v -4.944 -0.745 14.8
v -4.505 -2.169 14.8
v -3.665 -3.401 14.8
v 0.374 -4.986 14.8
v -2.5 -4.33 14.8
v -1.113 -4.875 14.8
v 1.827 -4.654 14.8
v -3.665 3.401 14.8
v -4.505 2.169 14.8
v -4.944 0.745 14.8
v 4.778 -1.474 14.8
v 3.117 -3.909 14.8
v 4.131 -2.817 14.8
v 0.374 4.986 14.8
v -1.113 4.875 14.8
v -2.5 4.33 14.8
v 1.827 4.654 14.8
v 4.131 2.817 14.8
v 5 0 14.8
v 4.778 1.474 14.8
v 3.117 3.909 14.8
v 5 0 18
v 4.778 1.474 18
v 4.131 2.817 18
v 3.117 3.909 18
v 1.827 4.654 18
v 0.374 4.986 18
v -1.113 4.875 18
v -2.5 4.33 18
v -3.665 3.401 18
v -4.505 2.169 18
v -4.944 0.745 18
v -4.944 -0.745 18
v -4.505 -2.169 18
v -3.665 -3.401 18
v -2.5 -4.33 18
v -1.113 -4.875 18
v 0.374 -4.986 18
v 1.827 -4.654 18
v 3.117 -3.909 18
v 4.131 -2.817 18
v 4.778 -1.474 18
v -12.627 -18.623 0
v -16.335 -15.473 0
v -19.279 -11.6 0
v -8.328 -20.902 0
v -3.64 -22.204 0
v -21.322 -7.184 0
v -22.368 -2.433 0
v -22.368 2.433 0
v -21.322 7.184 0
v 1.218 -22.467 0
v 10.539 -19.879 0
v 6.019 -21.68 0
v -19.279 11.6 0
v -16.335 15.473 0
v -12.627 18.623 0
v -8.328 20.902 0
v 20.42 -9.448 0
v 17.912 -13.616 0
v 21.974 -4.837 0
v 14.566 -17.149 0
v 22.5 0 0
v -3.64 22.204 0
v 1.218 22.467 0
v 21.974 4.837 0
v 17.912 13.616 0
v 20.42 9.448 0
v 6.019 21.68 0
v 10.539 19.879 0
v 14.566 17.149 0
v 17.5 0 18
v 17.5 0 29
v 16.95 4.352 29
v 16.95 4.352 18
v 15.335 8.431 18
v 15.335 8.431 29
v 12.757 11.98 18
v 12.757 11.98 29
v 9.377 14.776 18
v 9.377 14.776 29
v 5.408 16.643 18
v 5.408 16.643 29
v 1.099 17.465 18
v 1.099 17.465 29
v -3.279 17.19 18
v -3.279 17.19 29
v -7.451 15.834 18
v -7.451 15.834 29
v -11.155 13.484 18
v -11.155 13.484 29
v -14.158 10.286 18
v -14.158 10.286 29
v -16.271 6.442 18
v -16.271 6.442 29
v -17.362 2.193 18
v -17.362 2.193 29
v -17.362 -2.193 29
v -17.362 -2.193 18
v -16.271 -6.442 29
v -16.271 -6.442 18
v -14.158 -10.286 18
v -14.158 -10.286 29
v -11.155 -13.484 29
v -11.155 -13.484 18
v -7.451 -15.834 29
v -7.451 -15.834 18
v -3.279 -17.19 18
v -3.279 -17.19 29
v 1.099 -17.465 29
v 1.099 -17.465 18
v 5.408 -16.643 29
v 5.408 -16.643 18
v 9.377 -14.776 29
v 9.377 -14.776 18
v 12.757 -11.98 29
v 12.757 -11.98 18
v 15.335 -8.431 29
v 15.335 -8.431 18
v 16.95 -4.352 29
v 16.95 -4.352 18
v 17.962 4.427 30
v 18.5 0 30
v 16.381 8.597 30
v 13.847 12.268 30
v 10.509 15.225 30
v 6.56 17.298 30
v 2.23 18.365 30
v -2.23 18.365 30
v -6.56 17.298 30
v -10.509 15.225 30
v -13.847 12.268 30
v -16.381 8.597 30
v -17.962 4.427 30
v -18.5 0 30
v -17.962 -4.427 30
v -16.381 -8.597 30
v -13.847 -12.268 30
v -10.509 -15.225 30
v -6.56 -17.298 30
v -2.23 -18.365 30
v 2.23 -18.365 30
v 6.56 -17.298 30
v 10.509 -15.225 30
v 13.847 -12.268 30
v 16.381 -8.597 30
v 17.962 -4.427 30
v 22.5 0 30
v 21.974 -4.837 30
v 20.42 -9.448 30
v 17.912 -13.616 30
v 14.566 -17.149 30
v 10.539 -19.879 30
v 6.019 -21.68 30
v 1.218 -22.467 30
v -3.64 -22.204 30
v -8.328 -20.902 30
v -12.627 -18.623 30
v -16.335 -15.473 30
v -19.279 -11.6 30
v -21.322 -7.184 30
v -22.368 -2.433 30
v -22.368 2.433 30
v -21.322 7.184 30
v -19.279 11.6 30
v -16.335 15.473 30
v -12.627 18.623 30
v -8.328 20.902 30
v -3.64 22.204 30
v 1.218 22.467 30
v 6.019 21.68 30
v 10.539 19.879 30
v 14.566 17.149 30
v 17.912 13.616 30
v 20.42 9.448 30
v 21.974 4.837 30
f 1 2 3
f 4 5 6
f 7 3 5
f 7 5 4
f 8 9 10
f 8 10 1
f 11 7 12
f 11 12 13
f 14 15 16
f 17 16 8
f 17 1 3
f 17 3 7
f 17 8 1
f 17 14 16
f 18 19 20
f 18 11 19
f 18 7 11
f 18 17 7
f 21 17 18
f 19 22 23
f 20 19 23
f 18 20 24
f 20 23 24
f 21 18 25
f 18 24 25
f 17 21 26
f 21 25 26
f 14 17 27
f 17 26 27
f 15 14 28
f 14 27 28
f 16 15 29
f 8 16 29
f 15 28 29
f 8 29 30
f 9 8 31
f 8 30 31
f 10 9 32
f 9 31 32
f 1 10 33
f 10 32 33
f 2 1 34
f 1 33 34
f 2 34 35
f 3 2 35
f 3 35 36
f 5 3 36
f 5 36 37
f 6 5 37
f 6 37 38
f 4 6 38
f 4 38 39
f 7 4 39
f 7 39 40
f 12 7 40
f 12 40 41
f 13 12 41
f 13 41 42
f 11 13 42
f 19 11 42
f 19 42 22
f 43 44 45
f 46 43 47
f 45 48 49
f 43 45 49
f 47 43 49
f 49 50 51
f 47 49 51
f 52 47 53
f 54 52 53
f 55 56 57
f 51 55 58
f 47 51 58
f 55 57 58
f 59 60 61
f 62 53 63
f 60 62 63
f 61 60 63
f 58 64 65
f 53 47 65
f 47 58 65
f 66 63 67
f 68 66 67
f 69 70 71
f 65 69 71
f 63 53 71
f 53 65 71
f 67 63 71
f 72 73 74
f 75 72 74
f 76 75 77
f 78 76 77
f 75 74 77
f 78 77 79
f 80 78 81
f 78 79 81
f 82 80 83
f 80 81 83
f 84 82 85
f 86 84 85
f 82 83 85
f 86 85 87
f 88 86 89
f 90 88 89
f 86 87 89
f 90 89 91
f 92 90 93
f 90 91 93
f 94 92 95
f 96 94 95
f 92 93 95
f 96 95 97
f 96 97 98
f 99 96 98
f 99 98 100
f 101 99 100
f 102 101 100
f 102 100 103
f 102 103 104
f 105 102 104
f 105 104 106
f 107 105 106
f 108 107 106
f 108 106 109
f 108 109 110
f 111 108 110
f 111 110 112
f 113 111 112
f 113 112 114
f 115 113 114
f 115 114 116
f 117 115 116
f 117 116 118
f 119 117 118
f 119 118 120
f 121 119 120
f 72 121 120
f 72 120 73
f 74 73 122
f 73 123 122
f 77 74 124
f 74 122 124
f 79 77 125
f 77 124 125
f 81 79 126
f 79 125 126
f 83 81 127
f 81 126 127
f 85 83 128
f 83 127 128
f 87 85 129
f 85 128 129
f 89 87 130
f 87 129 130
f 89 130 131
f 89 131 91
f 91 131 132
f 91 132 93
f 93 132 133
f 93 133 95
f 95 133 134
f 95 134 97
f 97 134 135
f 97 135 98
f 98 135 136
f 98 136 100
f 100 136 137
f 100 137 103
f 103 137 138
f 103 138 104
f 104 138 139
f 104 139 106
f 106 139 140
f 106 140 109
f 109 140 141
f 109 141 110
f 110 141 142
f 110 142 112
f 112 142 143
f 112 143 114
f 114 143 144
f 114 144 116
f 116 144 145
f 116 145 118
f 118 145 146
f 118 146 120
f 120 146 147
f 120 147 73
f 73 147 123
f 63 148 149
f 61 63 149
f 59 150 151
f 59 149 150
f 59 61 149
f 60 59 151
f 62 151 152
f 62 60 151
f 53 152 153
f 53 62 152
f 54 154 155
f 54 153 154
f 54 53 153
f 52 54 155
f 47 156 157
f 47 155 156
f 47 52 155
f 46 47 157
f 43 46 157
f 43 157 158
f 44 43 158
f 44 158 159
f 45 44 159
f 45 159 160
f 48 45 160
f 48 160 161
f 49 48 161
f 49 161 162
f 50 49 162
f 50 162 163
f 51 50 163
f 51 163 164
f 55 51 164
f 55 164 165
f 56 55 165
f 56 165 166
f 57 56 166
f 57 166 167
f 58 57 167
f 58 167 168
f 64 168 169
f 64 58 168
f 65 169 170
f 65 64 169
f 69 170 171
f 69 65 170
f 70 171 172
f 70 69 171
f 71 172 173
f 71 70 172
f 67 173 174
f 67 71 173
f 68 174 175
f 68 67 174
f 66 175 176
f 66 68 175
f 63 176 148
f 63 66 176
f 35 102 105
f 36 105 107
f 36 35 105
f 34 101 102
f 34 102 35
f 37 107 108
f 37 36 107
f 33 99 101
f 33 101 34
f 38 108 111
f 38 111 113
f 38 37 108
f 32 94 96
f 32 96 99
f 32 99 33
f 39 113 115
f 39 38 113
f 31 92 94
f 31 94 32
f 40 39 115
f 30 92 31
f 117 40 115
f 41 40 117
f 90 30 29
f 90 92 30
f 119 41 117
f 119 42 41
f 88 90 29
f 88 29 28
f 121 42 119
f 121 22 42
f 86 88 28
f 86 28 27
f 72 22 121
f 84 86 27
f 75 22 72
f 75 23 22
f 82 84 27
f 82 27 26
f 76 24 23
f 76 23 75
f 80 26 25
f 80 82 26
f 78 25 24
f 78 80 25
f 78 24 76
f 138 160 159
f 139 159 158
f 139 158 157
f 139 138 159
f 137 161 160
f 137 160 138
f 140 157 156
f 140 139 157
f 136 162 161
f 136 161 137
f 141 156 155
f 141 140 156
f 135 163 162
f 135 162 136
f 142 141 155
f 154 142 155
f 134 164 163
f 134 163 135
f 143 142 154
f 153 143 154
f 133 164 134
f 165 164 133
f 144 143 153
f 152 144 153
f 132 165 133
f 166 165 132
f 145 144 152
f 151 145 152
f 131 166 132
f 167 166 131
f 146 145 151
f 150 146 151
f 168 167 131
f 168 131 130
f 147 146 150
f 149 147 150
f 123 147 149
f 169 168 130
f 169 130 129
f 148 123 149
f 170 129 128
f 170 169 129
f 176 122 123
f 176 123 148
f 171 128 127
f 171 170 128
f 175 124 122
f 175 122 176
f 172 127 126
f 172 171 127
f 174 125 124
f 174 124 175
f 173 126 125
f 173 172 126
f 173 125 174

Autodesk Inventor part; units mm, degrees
ref_plane "YZ Plane" through (0, 0, 0) normal (1, 0, 0) x (0, 1, 0)
ref_plane "XZ Plane" through (0, 0, 0) normal (0, 1, 0) x (-1, 0, 0)
ref_plane "XY Plane" through (0, 0, 0) normal (0, 0, 1) x (1, 0, 0)
sketch "Sketch1" plane through (0, 0, 0) normal (0, 0, 1) x (1, 0, 0)
  circle A0 centre (0, 0) radius 22.5
  dimension "d0" = 45
extrude "Extrusion1" add sketch "Sketch1" along normal blind 30
sketch "Sketch2" plane through (0, 0, 30) normal (0, 0, 1) x (1, 0, 0)
  circle A0 centre (0, 0) radius 17.5
  dimension "d3" = 35
extrude "Extrusion2" cut sketch "Sketch2" against normal blind 12
chamfer "Chamfer1" distance 1 angle 45 1 edges at (-17.5, 0, 30)
sketch "Sketch3" plane through (0, 0, 18) normal (0, 0, 1) x (1, 0, 0)
  circle A0 centre (0, 0) radius 5 projected
  circle A1 centre (0, 0) radius 5
  point P0 (0, 0)
extrude "Extrusion3" cut sketch "Sketch3" against normal blind 3.2
